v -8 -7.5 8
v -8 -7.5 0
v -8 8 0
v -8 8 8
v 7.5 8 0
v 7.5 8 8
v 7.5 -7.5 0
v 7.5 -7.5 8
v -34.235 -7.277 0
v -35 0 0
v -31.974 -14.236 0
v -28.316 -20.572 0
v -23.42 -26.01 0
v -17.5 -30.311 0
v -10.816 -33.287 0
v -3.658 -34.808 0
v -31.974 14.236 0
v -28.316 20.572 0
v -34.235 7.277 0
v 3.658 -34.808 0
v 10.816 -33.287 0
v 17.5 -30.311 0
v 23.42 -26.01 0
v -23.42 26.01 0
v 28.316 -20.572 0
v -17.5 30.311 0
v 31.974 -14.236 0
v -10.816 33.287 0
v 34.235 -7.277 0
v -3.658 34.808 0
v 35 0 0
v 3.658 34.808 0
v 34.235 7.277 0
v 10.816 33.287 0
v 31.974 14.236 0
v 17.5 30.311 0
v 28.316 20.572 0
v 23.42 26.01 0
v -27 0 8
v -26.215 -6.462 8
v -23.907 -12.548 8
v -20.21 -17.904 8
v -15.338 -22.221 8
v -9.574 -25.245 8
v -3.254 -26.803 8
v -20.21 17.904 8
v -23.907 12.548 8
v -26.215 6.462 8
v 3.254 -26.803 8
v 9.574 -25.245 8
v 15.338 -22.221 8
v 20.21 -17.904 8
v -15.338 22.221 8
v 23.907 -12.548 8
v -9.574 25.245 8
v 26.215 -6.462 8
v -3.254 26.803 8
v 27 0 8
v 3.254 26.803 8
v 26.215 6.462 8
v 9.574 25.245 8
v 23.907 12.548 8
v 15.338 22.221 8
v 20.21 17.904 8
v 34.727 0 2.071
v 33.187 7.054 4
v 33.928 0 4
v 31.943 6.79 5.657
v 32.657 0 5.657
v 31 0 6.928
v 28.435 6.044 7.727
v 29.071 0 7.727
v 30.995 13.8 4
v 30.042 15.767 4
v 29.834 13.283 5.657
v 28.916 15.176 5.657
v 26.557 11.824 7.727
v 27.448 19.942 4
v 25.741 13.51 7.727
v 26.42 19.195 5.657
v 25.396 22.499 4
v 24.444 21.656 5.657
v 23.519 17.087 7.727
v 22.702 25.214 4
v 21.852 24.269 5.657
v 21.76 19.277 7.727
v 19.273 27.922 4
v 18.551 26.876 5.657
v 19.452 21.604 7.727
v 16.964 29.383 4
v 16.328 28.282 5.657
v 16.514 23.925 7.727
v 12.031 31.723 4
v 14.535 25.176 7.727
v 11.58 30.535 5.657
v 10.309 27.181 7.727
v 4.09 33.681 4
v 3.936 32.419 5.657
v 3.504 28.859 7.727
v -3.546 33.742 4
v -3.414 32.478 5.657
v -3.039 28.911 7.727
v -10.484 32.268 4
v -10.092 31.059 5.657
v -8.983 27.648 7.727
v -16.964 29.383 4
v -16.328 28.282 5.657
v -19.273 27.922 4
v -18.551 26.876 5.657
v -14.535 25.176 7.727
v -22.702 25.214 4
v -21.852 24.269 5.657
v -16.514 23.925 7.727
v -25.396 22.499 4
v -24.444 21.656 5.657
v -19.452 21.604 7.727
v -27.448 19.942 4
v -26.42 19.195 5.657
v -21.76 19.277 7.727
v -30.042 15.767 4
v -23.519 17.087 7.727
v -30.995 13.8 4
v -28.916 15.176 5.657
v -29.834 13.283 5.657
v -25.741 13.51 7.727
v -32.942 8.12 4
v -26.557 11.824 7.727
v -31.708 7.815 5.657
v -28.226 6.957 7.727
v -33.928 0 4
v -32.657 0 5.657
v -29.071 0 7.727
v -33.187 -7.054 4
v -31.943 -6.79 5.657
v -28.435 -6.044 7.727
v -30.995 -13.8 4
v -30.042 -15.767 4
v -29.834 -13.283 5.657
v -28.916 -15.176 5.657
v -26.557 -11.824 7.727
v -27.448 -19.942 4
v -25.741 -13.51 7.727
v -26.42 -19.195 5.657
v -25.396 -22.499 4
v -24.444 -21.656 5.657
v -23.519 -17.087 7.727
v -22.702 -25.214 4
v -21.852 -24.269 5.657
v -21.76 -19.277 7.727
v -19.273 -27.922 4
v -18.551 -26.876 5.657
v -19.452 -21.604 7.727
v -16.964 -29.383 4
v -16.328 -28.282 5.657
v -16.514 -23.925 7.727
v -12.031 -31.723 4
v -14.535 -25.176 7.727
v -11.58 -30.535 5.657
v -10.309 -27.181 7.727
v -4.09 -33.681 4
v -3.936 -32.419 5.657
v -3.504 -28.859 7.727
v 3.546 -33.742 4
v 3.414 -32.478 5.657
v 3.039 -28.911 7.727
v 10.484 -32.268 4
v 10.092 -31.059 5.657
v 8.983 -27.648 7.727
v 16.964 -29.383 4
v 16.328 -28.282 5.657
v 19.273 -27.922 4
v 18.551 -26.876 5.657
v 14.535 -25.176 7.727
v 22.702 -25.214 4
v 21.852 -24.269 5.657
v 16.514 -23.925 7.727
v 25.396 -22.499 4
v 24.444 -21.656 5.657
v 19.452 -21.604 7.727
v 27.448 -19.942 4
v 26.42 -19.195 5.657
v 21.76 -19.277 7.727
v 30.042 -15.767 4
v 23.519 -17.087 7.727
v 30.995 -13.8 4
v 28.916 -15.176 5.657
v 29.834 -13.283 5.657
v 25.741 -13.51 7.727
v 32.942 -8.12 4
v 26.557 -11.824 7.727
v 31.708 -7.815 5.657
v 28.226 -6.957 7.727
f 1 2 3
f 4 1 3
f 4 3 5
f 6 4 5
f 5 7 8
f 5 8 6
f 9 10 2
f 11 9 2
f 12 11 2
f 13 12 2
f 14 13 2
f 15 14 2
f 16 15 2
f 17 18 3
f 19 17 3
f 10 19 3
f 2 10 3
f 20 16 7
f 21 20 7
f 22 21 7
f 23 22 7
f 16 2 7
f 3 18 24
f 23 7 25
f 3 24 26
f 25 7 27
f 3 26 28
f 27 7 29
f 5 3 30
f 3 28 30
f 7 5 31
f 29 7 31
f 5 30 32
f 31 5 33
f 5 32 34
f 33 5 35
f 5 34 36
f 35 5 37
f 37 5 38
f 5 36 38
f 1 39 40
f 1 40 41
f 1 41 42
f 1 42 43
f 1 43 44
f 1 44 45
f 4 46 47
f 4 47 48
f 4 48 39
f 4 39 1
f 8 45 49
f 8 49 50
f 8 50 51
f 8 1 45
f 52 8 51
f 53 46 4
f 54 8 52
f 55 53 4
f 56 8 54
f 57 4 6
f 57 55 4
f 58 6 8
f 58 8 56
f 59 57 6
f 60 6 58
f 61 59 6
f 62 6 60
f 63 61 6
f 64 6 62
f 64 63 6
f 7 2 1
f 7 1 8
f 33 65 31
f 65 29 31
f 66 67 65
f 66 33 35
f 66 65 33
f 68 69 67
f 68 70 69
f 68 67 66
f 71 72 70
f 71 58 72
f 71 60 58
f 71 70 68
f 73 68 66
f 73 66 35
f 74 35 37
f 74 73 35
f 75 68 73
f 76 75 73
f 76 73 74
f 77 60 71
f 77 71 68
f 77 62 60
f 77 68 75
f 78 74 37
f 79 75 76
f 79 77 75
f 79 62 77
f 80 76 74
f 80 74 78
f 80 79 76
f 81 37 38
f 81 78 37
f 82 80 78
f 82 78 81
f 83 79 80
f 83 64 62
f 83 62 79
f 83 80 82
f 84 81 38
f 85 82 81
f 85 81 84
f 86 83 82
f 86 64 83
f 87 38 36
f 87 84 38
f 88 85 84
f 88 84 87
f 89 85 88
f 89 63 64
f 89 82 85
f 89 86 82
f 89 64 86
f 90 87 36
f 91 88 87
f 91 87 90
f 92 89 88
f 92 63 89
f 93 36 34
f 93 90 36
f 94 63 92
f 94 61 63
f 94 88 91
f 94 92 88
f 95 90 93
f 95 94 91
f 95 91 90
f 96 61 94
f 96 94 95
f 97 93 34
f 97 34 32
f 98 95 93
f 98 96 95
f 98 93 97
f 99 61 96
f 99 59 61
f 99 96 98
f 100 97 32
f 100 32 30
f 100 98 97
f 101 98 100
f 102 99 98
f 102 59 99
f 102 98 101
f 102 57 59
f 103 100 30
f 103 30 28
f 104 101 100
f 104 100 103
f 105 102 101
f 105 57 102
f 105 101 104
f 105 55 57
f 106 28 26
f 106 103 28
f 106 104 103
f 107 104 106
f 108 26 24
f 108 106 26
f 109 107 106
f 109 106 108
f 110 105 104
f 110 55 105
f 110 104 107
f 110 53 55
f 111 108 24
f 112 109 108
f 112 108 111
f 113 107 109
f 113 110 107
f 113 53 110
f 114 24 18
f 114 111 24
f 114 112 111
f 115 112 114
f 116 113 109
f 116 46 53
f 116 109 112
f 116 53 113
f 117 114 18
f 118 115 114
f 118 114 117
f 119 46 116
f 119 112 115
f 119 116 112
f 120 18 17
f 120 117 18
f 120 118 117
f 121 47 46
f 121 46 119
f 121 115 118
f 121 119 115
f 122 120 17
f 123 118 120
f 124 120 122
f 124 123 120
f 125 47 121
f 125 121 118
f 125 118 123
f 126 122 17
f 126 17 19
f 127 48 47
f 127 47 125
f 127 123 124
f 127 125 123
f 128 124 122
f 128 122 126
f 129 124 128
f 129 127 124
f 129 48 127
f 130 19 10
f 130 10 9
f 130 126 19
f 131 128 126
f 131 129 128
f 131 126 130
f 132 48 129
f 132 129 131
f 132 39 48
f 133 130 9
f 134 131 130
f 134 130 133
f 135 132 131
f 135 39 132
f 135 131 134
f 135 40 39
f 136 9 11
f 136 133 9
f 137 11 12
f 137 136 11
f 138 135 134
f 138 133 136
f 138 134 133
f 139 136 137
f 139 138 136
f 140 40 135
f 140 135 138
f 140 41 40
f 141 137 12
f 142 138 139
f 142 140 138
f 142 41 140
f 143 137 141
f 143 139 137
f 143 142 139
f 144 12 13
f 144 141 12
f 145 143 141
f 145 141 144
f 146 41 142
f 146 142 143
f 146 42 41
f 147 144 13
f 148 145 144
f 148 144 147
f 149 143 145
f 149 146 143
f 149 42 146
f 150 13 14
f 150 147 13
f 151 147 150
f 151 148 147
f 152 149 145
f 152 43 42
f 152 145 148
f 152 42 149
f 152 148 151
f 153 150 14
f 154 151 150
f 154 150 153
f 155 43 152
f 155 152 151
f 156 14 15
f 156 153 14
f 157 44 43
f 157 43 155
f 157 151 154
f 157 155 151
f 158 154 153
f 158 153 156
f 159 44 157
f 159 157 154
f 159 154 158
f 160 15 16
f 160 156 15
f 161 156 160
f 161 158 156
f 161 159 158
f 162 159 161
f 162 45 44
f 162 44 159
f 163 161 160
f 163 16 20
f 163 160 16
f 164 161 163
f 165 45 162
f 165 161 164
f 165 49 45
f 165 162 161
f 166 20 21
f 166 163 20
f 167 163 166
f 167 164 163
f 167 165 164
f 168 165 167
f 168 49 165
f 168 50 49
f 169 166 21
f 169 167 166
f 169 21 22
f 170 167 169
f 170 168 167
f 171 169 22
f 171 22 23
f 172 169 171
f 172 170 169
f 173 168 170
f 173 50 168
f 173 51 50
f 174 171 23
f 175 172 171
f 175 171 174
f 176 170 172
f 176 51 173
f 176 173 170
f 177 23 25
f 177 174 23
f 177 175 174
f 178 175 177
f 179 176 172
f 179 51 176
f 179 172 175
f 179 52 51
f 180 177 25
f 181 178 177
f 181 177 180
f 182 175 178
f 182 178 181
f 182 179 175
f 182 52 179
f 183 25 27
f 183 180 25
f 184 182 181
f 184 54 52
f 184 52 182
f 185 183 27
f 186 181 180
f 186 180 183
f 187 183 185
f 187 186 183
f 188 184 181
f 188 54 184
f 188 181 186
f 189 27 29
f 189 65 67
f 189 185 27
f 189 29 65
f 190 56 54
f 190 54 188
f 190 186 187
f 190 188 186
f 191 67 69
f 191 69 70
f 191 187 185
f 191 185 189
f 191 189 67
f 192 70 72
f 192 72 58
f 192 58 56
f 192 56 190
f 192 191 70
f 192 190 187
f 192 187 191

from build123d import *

# Parameters (mm, degrees)
F0_R     = 35
F0_W     = 15.5
F0_H     = 15.5
F1_DEPTH = 8
F2_R     = 7.99999


# Not quite as in the source:
# - a fillet or chamfer is up to 0.001 mm smaller than in the source, because OpenCascade refuses the exact size


with BuildPart() as f1:
    # F0 (on Top) → F1 (new body)
    with BuildSketch(Plane.XY):
        Circle(F0_R)
        with Locations((-0.25, 0.25)):
            Rectangle(F0_W, F0_H, mode=Mode.SUBTRACT)
    extrude(amount=F1_DEPTH)

    # F2 (radius 8 in the source; OpenCascade refuses exactly that, so slightly less here)
    f2_edges = [f1.edges().sort_by_distance(p)[0] for p in [
        (-35, 0, 8),
    ]]
    fillet(f2_edges, radius=F2_R)


solid = f1.part
